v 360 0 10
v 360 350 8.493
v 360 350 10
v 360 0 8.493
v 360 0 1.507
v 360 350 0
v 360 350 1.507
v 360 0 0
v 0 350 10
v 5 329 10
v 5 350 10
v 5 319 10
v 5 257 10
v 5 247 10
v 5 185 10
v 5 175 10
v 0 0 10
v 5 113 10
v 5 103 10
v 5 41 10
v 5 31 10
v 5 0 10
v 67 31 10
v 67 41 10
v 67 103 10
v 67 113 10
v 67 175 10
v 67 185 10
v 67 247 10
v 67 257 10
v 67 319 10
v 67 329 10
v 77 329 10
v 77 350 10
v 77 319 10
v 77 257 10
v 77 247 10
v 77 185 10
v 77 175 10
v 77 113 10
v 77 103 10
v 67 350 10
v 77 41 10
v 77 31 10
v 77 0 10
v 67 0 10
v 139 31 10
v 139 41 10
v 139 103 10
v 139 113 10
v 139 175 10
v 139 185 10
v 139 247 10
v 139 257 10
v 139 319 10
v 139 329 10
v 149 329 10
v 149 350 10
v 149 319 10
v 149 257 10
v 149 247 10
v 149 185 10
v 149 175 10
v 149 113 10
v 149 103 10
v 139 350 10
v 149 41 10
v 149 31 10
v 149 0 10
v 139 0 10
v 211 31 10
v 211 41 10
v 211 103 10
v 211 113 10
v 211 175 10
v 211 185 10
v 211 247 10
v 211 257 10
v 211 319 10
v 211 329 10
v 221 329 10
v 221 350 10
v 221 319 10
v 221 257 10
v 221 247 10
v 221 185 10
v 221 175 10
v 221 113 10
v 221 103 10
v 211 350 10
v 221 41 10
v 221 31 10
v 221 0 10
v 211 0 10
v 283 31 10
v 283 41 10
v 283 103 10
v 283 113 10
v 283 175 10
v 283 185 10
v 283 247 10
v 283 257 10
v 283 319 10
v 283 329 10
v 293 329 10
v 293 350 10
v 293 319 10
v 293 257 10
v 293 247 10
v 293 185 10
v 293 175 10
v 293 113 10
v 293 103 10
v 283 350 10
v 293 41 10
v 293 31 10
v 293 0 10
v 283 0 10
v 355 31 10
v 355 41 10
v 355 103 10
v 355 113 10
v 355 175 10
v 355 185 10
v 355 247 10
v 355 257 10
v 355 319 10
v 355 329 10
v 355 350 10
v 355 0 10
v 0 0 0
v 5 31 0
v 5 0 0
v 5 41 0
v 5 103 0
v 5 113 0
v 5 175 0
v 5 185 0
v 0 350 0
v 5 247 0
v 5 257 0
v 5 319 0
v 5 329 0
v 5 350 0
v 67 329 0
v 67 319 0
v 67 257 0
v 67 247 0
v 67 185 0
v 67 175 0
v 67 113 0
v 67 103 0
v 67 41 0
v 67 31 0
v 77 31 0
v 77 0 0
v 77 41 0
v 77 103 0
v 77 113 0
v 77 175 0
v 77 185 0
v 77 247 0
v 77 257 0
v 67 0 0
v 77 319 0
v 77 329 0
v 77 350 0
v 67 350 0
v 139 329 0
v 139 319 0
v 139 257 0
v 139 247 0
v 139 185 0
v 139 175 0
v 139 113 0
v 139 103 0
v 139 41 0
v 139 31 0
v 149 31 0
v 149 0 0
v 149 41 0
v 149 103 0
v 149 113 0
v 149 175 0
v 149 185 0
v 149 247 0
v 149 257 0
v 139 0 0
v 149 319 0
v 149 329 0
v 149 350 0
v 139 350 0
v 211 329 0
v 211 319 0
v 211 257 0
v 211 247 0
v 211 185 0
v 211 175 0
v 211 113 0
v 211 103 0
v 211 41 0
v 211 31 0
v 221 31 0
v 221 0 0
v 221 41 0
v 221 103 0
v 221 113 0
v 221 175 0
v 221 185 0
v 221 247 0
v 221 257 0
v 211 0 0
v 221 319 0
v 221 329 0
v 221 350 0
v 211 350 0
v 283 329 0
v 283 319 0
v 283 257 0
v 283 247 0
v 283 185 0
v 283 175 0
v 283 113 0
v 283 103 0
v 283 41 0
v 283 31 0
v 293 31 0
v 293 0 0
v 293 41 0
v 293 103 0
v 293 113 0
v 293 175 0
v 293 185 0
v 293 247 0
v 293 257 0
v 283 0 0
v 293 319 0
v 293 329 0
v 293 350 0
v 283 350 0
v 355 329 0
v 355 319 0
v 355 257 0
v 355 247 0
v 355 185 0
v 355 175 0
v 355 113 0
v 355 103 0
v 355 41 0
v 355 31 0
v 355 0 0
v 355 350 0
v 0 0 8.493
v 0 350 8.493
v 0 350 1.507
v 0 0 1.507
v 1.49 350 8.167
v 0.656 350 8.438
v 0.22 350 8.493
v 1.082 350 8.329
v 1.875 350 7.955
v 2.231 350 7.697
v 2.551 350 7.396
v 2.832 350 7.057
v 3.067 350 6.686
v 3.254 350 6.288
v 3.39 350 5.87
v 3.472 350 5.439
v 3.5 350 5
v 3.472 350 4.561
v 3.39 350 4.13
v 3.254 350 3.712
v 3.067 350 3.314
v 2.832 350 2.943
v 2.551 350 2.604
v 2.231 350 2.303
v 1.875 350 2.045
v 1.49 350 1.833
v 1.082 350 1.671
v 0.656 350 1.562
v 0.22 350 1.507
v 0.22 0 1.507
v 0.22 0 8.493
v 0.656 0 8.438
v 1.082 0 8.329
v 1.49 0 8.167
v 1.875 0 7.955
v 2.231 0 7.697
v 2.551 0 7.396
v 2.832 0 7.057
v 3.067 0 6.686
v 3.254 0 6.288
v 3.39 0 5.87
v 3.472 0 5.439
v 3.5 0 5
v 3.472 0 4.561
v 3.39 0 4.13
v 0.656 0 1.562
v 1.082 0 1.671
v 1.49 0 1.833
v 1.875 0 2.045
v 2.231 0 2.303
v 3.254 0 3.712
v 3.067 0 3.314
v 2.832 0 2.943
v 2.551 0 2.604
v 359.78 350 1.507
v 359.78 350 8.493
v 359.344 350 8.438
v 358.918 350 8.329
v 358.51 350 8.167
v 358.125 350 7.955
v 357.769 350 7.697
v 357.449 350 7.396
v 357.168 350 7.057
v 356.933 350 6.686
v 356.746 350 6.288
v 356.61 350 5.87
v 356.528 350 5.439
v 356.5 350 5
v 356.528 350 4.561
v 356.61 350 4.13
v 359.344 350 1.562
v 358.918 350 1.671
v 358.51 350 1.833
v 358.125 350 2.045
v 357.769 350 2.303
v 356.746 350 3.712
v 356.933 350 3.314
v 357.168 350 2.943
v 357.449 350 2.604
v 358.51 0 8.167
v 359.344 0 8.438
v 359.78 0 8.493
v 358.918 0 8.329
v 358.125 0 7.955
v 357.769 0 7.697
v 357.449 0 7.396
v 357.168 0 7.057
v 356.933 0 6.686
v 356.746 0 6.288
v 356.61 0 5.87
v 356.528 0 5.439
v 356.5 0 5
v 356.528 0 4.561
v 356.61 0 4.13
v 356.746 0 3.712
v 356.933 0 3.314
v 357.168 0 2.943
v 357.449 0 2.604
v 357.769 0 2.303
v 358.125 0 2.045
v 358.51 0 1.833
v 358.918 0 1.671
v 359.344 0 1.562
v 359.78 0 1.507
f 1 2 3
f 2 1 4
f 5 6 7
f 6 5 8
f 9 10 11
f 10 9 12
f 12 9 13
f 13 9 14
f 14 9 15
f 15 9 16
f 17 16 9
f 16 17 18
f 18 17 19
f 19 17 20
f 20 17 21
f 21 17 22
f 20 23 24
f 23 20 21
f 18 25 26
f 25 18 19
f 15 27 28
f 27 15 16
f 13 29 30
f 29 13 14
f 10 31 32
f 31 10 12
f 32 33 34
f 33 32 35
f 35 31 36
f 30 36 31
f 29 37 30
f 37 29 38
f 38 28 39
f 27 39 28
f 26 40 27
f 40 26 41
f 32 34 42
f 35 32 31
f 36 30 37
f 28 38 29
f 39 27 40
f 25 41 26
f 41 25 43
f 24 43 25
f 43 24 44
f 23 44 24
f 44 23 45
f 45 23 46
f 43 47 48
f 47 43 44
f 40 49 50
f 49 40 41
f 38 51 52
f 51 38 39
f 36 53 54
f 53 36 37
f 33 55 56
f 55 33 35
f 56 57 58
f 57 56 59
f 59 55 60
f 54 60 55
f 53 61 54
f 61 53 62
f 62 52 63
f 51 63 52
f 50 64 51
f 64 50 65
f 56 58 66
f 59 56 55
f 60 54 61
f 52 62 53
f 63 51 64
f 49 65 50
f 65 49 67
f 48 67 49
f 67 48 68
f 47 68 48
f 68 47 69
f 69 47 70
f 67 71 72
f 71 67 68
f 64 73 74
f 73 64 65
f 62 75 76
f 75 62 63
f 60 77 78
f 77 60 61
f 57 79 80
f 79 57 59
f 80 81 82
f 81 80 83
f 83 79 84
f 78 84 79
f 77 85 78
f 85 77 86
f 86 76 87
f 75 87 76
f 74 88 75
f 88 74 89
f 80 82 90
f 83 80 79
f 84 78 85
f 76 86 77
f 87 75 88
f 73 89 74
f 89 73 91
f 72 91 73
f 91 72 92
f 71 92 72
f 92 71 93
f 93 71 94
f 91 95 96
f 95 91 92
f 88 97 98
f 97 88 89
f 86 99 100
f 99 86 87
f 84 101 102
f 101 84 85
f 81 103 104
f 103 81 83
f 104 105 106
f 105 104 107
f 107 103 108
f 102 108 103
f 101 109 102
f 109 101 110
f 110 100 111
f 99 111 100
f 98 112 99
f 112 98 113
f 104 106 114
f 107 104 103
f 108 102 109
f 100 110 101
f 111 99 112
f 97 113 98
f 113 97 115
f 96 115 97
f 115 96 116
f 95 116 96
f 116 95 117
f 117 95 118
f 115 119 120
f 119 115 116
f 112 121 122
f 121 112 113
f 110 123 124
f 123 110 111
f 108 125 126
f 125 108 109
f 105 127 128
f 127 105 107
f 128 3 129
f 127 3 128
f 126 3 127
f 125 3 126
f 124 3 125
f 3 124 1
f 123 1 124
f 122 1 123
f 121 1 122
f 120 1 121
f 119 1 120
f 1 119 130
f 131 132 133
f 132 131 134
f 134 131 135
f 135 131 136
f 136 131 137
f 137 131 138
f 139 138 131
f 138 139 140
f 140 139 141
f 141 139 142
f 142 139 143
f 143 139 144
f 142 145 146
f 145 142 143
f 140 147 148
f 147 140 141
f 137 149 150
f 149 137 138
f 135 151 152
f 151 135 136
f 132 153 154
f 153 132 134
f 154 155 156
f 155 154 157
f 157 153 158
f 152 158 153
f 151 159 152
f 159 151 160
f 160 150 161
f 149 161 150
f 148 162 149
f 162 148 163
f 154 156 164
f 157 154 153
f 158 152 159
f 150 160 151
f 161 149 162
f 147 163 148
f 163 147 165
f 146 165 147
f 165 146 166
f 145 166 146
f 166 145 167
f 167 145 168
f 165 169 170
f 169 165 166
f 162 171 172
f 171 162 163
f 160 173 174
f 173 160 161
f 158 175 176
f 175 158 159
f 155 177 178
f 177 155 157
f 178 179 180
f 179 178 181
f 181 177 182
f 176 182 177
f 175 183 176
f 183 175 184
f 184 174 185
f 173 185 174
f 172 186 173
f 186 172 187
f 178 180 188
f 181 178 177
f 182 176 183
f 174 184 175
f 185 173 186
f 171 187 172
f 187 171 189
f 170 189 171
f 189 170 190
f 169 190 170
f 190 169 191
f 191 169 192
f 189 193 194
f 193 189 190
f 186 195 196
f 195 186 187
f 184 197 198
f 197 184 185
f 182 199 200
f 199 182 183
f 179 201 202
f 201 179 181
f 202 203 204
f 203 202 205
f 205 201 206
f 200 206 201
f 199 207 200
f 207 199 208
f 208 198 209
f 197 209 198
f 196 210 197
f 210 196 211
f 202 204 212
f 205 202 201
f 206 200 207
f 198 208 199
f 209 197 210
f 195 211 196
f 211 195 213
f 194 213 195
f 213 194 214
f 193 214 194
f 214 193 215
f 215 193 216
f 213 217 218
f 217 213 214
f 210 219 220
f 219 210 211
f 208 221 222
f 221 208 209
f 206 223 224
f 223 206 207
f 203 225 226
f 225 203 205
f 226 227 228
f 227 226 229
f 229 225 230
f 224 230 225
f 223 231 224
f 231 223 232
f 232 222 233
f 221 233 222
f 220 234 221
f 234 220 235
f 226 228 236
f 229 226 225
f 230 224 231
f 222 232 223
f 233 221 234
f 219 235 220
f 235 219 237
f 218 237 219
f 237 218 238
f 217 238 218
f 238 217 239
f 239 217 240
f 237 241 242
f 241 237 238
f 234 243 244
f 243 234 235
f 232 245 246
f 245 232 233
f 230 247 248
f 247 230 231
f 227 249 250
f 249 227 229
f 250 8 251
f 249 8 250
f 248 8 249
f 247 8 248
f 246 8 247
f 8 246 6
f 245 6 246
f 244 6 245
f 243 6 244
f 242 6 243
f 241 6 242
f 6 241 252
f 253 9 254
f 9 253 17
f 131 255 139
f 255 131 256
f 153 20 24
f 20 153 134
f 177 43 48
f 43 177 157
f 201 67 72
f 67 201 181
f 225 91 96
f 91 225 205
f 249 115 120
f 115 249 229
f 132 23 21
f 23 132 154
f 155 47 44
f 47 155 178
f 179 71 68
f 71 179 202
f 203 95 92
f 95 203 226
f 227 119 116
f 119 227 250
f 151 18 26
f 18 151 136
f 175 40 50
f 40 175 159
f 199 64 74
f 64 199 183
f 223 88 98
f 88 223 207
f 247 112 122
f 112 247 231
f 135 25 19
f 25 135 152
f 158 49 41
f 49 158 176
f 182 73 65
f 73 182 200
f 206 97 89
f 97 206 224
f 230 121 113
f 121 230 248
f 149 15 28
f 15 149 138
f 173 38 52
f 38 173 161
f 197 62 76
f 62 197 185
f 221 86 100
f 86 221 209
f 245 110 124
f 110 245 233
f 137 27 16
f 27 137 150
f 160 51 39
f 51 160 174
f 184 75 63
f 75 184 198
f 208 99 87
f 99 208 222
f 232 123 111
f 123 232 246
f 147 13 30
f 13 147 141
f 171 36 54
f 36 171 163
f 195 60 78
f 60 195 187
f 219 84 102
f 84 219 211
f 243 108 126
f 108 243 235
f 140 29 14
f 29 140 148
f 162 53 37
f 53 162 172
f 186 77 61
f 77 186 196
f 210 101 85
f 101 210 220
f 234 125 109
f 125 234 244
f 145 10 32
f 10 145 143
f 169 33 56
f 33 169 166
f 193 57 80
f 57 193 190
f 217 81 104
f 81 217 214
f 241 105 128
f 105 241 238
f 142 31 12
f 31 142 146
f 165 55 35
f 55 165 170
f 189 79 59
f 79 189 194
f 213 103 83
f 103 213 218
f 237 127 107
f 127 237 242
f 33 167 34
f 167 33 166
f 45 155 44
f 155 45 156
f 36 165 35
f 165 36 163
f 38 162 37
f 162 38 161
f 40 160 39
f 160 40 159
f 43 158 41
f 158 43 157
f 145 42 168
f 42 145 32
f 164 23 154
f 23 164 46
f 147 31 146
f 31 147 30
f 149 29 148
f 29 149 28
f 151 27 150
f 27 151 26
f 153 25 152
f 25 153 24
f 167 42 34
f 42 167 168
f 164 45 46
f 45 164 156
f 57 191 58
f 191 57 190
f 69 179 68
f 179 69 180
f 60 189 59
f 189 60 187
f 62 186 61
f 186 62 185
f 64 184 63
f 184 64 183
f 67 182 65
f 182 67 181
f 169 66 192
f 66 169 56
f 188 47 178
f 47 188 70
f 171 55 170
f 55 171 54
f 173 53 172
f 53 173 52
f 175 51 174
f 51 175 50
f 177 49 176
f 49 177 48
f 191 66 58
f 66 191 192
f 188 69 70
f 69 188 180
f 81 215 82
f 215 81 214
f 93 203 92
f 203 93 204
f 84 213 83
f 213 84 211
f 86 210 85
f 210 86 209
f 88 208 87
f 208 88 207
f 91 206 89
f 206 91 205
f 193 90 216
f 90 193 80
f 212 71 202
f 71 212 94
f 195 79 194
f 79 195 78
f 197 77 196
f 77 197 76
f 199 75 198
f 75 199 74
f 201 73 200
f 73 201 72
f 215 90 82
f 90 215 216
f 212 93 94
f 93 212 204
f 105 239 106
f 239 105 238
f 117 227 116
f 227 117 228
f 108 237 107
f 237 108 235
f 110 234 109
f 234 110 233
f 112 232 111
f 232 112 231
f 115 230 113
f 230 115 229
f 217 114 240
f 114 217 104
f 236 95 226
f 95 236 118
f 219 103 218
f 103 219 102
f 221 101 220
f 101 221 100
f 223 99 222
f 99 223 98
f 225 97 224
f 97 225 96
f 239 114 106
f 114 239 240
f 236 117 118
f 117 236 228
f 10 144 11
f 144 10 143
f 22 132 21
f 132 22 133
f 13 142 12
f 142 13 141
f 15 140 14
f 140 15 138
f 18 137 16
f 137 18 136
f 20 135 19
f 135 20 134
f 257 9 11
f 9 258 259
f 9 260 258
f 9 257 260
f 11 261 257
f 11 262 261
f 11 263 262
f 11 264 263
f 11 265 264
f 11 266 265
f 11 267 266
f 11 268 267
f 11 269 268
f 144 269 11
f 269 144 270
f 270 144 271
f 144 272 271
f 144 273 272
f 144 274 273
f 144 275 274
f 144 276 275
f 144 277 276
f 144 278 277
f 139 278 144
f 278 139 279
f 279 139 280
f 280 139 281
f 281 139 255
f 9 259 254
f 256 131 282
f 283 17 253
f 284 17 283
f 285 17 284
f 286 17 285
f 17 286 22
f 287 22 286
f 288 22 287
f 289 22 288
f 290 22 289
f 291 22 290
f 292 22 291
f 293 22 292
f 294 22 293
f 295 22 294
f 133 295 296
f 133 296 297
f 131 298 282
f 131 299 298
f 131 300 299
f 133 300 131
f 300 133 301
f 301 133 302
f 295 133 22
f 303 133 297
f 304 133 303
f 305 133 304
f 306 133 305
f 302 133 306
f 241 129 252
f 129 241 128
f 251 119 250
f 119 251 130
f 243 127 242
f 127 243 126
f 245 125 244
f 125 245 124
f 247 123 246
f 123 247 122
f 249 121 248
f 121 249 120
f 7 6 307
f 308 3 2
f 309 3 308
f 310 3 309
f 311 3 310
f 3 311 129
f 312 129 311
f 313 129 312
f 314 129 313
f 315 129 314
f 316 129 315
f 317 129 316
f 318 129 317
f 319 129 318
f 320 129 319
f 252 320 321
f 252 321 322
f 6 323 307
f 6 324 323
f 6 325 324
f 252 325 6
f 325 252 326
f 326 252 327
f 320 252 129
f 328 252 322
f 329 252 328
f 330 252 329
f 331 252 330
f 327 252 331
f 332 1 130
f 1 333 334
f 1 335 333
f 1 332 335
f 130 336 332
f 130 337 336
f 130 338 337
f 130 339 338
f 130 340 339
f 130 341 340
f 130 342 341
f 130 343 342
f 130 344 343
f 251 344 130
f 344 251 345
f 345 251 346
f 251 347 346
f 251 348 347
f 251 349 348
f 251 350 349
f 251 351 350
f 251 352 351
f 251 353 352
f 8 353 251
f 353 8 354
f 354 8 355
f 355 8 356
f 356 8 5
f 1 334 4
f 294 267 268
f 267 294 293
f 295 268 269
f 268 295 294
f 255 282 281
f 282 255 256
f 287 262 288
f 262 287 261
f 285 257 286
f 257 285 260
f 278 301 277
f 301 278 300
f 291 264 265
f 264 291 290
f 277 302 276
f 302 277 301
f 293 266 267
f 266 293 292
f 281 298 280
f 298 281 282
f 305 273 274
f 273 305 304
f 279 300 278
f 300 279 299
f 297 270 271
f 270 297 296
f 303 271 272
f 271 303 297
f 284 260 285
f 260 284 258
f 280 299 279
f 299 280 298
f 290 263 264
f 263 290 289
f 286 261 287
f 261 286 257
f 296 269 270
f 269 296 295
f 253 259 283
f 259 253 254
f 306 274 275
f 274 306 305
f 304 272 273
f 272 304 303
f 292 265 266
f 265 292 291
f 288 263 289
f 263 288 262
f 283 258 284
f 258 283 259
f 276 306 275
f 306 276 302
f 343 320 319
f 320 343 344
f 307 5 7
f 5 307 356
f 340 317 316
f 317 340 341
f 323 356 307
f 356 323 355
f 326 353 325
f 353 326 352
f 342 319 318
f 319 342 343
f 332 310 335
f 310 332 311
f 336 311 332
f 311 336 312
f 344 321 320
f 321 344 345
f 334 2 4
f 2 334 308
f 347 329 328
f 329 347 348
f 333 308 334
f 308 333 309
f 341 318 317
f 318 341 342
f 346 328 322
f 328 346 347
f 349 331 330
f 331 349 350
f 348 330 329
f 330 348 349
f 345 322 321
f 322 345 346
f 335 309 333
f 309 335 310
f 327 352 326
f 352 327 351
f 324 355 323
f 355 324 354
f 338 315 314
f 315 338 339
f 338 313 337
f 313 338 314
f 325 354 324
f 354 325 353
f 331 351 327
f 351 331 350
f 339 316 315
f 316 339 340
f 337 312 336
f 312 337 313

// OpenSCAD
difference()
{
  union()
  {
    translate([67, 0, 0]) cube([10, 350, 10]);
    translate([139, 0, 0]) cube([10, 350, 10]);
    translate([211, 0, 0]) cube([10, 350, 10]);
    translate([283, 0, 0]) cube([10, 350, 10]);
    h = [36, 108, 180, 252, 324];
    for(c = h)
    {
      translate([0, c -5, 0]) cube([360, 10, 10]);
    }
    translate([0, 0, 0]) cube([5, 350, 10]);
    translate([355, 0, 0]) cube([5, 350, 10]);
  }
  intersection()
  {
    translate([0, 175, 5]) rotate([90, 0, 0]) cylinder(h = 352, r = 3.5, $fn = 50, center = true);
    translate([0, 0, 0]) cube([10, 350, 10]);
  }
  intersection()
  {
    translate([360, 175, 5]) rotate([90, 0, 0]) cylinder(h = 352, r = 3.5, $fn = 50, center = true);
    translate([350, 0, 0]) cube([10, 350, 10]);
  }
}
